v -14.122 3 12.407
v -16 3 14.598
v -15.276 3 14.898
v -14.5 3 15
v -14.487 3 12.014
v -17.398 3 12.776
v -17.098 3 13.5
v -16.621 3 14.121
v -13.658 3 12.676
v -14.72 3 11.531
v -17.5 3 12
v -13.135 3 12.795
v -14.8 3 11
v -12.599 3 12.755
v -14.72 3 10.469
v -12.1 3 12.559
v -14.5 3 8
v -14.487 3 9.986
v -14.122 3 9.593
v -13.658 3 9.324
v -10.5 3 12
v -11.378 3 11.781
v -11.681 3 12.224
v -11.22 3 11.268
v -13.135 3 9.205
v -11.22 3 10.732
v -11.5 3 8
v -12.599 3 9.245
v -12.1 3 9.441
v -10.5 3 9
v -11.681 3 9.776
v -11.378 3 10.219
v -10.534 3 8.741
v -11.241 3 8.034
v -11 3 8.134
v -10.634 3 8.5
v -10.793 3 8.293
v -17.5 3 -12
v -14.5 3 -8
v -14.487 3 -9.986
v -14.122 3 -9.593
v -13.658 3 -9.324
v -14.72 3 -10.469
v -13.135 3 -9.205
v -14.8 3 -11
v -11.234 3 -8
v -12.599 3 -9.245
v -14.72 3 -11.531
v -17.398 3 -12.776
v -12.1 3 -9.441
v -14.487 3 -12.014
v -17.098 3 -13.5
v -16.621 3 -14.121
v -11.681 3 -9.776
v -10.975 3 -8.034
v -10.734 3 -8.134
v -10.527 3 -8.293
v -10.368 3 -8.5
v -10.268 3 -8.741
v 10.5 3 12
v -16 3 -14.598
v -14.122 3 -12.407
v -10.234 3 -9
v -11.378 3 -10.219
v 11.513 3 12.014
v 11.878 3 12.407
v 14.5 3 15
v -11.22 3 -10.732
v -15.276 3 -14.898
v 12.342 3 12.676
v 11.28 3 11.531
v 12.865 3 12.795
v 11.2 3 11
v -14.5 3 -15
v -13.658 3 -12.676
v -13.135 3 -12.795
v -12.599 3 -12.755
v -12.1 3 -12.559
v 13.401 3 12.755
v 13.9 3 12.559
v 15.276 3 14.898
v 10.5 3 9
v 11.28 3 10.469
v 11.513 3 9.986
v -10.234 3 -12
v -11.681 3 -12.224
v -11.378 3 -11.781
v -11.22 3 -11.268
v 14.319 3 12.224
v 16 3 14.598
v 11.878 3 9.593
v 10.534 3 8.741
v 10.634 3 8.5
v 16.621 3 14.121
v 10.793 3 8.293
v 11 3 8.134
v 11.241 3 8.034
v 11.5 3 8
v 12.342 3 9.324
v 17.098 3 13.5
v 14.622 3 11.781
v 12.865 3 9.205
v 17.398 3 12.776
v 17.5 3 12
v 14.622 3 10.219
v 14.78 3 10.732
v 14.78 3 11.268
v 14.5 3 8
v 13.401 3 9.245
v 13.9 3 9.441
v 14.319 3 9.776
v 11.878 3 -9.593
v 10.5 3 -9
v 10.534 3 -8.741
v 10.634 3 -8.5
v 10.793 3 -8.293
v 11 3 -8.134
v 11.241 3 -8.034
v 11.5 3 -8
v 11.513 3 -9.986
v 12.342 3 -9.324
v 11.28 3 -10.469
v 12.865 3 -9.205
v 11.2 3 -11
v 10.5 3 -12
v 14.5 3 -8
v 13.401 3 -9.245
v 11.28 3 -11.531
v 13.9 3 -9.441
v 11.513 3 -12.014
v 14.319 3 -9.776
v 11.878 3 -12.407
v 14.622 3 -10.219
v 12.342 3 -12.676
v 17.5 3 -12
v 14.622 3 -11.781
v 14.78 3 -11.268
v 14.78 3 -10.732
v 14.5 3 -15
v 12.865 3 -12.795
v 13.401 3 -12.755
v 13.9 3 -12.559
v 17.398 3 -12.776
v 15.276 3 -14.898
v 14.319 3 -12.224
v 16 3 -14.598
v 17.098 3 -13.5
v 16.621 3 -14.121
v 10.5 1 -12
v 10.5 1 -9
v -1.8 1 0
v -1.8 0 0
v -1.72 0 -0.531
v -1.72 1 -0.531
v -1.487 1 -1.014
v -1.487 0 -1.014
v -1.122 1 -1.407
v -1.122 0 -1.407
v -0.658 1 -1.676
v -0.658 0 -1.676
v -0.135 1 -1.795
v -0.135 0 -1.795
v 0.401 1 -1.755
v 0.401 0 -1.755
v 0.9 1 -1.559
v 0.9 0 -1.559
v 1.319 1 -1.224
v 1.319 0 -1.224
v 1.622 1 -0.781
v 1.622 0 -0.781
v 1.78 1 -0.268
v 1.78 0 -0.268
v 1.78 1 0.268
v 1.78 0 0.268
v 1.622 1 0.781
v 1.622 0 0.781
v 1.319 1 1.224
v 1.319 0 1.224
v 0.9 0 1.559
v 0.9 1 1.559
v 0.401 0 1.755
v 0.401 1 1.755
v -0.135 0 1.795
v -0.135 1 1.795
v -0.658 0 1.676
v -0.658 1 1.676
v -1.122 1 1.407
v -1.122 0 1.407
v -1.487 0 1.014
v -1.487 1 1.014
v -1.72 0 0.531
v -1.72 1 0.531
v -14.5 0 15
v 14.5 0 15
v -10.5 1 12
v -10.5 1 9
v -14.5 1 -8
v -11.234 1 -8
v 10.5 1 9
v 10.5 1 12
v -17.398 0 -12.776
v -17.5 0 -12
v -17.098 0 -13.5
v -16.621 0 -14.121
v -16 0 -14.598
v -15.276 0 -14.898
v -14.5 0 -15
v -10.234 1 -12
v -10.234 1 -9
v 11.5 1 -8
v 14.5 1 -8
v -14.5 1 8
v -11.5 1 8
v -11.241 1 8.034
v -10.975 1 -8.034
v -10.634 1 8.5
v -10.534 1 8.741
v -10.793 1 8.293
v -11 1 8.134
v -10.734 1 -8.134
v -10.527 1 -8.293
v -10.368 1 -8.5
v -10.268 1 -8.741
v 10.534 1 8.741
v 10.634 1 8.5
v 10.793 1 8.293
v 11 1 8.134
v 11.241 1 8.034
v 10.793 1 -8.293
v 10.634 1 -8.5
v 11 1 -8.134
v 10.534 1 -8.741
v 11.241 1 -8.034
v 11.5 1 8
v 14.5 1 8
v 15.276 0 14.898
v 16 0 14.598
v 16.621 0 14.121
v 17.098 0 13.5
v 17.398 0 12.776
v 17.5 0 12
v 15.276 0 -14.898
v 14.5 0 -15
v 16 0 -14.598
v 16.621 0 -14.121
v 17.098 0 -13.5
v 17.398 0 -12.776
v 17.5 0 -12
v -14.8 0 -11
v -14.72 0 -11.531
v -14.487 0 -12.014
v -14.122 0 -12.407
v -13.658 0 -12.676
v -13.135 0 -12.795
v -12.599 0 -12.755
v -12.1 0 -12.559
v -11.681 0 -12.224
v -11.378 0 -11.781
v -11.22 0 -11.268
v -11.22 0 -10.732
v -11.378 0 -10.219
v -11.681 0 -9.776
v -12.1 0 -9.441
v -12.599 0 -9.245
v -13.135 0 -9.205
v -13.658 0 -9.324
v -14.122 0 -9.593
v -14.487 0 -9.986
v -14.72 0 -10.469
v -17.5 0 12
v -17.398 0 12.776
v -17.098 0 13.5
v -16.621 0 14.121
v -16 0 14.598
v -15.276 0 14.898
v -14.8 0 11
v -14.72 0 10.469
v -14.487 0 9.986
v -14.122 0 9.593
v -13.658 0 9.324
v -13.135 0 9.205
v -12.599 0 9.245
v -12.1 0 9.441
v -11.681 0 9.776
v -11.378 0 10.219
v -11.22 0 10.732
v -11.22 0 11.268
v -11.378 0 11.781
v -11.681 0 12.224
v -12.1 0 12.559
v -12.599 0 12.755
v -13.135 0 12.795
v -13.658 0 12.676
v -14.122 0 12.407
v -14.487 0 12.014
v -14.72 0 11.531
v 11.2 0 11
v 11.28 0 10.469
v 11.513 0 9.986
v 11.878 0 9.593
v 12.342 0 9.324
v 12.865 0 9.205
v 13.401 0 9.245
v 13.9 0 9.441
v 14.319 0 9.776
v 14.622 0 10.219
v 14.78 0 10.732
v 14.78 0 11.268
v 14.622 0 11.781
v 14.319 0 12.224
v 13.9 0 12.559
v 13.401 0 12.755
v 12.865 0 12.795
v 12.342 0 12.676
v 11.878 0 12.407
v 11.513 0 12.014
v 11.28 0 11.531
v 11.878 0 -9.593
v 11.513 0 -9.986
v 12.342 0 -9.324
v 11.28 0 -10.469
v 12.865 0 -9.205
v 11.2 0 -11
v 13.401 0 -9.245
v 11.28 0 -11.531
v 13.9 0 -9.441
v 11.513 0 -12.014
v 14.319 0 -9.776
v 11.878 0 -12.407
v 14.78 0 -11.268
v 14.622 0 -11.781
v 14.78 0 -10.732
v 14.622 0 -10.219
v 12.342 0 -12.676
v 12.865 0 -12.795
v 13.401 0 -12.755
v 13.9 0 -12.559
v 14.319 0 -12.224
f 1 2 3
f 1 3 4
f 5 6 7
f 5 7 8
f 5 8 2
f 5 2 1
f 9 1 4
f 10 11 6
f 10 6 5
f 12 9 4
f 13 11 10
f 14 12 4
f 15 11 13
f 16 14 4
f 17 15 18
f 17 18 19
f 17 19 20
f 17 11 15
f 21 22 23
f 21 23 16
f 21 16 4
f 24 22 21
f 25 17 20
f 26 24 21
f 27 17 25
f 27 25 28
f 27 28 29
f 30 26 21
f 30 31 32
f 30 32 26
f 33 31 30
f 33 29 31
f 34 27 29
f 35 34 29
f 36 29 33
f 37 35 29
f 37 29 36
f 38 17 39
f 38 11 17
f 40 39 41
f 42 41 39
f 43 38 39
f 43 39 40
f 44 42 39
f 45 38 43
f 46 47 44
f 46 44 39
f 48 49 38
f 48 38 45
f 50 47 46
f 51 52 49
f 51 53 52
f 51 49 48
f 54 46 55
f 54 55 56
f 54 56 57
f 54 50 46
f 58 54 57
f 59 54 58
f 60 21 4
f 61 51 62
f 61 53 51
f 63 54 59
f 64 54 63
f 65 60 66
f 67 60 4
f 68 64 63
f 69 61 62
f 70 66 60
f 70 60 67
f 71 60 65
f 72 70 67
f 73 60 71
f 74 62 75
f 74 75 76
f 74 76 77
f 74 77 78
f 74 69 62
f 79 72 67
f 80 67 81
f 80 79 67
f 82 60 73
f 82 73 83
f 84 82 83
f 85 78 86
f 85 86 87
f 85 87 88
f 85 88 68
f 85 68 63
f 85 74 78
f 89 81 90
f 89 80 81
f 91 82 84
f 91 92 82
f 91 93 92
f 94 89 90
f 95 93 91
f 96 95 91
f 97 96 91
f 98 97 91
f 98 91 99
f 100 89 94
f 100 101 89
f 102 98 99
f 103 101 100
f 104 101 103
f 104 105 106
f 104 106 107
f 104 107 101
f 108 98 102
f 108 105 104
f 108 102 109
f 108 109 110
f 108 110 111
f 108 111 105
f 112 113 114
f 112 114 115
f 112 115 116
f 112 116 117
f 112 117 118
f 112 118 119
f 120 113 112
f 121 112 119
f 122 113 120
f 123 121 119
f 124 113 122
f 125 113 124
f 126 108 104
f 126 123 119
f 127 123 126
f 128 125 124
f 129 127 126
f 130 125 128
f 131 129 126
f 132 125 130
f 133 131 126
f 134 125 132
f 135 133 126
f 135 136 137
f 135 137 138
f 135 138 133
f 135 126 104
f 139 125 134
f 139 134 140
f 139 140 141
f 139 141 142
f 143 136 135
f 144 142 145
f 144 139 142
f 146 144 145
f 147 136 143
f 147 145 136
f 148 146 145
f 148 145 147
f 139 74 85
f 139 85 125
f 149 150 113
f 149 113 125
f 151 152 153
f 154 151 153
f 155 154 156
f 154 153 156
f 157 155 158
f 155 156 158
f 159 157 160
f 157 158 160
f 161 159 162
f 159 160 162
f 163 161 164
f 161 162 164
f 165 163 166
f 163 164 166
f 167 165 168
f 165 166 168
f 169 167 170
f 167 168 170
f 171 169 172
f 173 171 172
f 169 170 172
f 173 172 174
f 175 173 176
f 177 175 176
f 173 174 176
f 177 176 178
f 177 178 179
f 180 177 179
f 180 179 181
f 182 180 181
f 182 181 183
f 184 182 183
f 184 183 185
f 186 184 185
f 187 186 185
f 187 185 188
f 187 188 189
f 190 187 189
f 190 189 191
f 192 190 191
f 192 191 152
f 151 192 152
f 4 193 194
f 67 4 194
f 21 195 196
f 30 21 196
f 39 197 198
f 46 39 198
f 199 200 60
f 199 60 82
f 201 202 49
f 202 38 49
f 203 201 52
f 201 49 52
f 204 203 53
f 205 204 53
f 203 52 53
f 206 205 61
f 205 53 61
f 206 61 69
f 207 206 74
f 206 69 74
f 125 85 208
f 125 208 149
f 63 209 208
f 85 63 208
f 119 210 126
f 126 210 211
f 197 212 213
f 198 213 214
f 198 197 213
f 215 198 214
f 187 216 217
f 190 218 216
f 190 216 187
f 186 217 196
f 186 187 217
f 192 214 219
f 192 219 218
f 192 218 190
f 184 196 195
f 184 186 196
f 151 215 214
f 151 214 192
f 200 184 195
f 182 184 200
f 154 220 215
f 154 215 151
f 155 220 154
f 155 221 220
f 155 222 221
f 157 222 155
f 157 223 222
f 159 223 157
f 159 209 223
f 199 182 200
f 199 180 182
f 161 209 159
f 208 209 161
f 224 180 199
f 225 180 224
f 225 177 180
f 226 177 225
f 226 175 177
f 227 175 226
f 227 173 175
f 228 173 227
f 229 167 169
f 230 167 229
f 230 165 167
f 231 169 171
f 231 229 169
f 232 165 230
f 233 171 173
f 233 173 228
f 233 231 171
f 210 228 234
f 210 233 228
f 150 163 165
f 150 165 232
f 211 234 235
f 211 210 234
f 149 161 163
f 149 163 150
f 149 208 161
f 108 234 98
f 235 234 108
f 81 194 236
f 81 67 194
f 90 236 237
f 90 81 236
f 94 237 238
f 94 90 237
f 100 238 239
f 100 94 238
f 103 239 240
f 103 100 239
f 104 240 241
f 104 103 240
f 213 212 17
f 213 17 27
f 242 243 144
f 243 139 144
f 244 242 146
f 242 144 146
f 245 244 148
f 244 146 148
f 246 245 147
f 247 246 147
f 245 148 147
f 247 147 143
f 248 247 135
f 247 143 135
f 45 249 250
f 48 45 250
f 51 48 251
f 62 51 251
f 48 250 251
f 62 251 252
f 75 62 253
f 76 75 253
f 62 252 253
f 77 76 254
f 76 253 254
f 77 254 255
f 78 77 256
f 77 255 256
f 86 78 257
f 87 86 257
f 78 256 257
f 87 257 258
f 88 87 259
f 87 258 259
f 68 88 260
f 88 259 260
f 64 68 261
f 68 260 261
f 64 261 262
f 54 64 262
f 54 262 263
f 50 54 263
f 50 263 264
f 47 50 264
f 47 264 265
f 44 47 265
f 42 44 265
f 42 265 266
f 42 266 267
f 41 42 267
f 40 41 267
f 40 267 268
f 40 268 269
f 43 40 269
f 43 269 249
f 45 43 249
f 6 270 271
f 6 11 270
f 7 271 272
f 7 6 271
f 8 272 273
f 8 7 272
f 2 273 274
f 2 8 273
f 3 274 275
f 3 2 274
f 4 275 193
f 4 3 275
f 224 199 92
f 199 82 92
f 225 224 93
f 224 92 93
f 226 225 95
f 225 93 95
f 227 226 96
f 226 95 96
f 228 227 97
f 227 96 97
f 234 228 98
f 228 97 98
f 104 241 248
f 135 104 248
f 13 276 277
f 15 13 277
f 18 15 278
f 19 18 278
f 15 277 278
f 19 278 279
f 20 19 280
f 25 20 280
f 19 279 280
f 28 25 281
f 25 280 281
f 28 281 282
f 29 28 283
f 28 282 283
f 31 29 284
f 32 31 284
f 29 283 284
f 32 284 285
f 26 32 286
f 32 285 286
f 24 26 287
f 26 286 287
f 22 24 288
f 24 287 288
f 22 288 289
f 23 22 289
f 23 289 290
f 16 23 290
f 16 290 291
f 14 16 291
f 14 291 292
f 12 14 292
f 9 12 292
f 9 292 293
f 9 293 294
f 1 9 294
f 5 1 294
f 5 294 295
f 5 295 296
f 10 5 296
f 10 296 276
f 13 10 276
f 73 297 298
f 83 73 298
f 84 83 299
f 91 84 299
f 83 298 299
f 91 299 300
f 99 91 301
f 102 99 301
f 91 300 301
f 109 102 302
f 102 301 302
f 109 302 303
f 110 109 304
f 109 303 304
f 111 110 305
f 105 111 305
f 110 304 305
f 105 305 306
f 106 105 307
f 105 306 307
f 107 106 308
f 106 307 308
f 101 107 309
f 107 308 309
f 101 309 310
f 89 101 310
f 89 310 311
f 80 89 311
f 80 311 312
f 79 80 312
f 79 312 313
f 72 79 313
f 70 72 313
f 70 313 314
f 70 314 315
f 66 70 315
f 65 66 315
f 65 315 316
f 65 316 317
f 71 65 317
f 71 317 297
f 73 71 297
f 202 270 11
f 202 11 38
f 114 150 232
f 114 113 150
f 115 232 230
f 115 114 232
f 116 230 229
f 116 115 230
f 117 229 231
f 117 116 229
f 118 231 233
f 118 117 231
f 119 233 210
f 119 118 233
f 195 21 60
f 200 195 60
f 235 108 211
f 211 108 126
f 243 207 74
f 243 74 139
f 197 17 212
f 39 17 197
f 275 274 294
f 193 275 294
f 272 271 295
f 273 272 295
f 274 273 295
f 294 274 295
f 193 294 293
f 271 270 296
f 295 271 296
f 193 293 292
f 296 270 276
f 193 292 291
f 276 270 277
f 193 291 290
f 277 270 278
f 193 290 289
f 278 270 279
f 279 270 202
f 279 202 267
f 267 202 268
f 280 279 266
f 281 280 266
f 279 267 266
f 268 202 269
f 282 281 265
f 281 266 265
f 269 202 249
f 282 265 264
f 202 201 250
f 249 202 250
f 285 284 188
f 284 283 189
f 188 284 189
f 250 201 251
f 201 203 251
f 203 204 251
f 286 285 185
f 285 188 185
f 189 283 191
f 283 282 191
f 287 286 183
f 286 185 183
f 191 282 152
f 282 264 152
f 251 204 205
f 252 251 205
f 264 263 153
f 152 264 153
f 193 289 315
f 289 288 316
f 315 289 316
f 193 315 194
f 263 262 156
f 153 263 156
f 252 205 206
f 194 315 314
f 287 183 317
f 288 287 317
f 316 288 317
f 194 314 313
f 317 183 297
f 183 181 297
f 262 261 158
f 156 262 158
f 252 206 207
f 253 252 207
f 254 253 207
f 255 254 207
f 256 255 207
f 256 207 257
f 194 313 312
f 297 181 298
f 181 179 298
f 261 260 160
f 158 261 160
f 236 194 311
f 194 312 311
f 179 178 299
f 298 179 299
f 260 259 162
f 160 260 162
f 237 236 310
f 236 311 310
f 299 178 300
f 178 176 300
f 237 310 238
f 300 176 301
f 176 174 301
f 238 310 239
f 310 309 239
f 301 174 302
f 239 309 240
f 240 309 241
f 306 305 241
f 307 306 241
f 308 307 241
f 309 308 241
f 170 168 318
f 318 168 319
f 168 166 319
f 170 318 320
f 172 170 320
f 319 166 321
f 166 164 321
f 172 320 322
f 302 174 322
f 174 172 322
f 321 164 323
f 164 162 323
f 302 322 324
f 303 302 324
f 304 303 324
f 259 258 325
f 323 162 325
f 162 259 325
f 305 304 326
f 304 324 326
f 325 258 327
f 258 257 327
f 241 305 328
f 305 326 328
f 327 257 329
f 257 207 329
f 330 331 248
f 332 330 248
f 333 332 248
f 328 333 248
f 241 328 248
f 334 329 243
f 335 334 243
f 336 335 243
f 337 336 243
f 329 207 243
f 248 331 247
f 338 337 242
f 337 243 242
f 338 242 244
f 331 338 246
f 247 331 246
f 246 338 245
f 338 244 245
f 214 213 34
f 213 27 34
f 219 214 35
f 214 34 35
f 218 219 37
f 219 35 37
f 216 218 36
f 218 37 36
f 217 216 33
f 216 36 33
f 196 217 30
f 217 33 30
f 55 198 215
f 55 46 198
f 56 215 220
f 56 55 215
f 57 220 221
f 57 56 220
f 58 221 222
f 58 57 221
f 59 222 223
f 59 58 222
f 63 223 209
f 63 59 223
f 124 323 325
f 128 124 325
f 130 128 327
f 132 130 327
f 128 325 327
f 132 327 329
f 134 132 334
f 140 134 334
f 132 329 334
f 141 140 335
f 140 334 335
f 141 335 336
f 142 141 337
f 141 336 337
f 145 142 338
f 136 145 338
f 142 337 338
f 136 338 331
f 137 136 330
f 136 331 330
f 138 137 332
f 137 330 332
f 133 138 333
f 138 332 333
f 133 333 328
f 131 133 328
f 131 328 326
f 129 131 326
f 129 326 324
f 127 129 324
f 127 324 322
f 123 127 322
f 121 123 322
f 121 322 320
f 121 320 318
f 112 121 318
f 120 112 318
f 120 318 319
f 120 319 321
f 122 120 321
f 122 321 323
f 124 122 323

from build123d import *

# Parameters (mm, degrees)
SKETCH1_W            = 35
SKETCH1_H            = 30
BOSS_EXTRUDE1_DEPTH  = 3
SKETCH2_W            = 29
SKETCH2_H            = 24
CUT_EXTRUDE1_DEPTH   = 2
SKETCH5_W            = 4.266255033
SKETCH5_H            = 4
SKETCH5_W_2          = 4
BOSS_EXTRUDE2_DEPTH  = 2
M3_CLEARANCE_HOLE1_D = 3.6
FILLET1_R            = 3
FILLET2_R            = 1


with BuildPart() as part:
    # Sketch1 → Boss-Extrude1 (new body)
    with BuildSketch(Plane(origin=(0, 0, 0), x_dir=(1, 0, 0), z_dir=(0, 1, 0))):
        Rectangle(SKETCH1_W, SKETCH1_H)
    extrude(amount=BOSS_EXTRUDE1_DEPTH)

    # Sketch2 → Cut-Extrude1 (cut)
    with BuildSketch(Plane(origin=(0, 3, 0), x_dir=(1, 0, 0), z_dir=(0, 1, 0))):
        Rectangle(SKETCH2_W, SKETCH2_H)
    extrude(amount=-CUT_EXTRUDE1_DEPTH, mode=Mode.SUBTRACT)

    # Sketch5 → Boss-Extrude2 (add)
    with BuildSketch(Plane(origin=(0, 1, 0), x_dir=(1, 0, 0), z_dir=(0, 1, 0))):
        with Locations((-12.366872483, 10)):
            Rectangle(SKETCH5_W, SKETCH5_H)
        with Locations((12.5, 10)):
            Rectangle(SKETCH5_W_2, SKETCH5_H)
        with Locations((12.5, -10)):
            Rectangle(SKETCH5_W_2, SKETCH5_H)
        with Locations((-12.5, -10)):
            Rectangle(SKETCH5_W_2, SKETCH5_H)
    extrude(amount=BOSS_EXTRUDE2_DEPTH)

    # M3 Clearance Hole1 (through all)
    with Locations(Plane(origin=(0, 3, 0), x_dir=(1, 0, 0), z_dir=(0, 1, 0))):
        with Locations((0, 0), (13, 11), (-13, -11), (-13, 11), (13, -11)):
            Hole(M3_CLEARANCE_HOLE1_D / 2)

    # Fillet1
    fillet1_edges = [part.edges().sort_by_distance(p)[0] for p in [
        (17.5, 1.5, 15),
        (-17.5, 1.5, 15),
        (-17.5, 1.5, -15),
        (17.5, 1.5, -15),
    ]]
    fillet(fillet1_edges, radius=FILLET1_R)

    # Fillet2
    fillet2_edges = [part.edges().sort_by_distance(p)[0] for p in [
        (-10.233744967, 2, -8),
        (10.5, 2, -8),
        (10.5, 2, 8),
        (-10.5, 2, 8),
    ]]
    fillet(fillet2_edges, radius=FILLET2_R)


solid = part.part
